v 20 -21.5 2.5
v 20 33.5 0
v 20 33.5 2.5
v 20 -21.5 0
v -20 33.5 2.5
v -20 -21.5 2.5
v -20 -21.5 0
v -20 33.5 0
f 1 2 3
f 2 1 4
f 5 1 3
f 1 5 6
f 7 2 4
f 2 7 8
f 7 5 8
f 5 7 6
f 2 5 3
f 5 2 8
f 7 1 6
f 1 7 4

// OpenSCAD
slide_width = 40;
slide_depth = 2.5;
slide_height = 55;

module slide() {
	color([0,0,1])translate([-slide_width/2,-21.5,0])cube([slide_width, slide_height, slide_depth]);
}

module star(){
translate([0,0,-5])
linear_extrude(height = 10) import("star.dxf");
}

difference(){
slide();
star();
}
